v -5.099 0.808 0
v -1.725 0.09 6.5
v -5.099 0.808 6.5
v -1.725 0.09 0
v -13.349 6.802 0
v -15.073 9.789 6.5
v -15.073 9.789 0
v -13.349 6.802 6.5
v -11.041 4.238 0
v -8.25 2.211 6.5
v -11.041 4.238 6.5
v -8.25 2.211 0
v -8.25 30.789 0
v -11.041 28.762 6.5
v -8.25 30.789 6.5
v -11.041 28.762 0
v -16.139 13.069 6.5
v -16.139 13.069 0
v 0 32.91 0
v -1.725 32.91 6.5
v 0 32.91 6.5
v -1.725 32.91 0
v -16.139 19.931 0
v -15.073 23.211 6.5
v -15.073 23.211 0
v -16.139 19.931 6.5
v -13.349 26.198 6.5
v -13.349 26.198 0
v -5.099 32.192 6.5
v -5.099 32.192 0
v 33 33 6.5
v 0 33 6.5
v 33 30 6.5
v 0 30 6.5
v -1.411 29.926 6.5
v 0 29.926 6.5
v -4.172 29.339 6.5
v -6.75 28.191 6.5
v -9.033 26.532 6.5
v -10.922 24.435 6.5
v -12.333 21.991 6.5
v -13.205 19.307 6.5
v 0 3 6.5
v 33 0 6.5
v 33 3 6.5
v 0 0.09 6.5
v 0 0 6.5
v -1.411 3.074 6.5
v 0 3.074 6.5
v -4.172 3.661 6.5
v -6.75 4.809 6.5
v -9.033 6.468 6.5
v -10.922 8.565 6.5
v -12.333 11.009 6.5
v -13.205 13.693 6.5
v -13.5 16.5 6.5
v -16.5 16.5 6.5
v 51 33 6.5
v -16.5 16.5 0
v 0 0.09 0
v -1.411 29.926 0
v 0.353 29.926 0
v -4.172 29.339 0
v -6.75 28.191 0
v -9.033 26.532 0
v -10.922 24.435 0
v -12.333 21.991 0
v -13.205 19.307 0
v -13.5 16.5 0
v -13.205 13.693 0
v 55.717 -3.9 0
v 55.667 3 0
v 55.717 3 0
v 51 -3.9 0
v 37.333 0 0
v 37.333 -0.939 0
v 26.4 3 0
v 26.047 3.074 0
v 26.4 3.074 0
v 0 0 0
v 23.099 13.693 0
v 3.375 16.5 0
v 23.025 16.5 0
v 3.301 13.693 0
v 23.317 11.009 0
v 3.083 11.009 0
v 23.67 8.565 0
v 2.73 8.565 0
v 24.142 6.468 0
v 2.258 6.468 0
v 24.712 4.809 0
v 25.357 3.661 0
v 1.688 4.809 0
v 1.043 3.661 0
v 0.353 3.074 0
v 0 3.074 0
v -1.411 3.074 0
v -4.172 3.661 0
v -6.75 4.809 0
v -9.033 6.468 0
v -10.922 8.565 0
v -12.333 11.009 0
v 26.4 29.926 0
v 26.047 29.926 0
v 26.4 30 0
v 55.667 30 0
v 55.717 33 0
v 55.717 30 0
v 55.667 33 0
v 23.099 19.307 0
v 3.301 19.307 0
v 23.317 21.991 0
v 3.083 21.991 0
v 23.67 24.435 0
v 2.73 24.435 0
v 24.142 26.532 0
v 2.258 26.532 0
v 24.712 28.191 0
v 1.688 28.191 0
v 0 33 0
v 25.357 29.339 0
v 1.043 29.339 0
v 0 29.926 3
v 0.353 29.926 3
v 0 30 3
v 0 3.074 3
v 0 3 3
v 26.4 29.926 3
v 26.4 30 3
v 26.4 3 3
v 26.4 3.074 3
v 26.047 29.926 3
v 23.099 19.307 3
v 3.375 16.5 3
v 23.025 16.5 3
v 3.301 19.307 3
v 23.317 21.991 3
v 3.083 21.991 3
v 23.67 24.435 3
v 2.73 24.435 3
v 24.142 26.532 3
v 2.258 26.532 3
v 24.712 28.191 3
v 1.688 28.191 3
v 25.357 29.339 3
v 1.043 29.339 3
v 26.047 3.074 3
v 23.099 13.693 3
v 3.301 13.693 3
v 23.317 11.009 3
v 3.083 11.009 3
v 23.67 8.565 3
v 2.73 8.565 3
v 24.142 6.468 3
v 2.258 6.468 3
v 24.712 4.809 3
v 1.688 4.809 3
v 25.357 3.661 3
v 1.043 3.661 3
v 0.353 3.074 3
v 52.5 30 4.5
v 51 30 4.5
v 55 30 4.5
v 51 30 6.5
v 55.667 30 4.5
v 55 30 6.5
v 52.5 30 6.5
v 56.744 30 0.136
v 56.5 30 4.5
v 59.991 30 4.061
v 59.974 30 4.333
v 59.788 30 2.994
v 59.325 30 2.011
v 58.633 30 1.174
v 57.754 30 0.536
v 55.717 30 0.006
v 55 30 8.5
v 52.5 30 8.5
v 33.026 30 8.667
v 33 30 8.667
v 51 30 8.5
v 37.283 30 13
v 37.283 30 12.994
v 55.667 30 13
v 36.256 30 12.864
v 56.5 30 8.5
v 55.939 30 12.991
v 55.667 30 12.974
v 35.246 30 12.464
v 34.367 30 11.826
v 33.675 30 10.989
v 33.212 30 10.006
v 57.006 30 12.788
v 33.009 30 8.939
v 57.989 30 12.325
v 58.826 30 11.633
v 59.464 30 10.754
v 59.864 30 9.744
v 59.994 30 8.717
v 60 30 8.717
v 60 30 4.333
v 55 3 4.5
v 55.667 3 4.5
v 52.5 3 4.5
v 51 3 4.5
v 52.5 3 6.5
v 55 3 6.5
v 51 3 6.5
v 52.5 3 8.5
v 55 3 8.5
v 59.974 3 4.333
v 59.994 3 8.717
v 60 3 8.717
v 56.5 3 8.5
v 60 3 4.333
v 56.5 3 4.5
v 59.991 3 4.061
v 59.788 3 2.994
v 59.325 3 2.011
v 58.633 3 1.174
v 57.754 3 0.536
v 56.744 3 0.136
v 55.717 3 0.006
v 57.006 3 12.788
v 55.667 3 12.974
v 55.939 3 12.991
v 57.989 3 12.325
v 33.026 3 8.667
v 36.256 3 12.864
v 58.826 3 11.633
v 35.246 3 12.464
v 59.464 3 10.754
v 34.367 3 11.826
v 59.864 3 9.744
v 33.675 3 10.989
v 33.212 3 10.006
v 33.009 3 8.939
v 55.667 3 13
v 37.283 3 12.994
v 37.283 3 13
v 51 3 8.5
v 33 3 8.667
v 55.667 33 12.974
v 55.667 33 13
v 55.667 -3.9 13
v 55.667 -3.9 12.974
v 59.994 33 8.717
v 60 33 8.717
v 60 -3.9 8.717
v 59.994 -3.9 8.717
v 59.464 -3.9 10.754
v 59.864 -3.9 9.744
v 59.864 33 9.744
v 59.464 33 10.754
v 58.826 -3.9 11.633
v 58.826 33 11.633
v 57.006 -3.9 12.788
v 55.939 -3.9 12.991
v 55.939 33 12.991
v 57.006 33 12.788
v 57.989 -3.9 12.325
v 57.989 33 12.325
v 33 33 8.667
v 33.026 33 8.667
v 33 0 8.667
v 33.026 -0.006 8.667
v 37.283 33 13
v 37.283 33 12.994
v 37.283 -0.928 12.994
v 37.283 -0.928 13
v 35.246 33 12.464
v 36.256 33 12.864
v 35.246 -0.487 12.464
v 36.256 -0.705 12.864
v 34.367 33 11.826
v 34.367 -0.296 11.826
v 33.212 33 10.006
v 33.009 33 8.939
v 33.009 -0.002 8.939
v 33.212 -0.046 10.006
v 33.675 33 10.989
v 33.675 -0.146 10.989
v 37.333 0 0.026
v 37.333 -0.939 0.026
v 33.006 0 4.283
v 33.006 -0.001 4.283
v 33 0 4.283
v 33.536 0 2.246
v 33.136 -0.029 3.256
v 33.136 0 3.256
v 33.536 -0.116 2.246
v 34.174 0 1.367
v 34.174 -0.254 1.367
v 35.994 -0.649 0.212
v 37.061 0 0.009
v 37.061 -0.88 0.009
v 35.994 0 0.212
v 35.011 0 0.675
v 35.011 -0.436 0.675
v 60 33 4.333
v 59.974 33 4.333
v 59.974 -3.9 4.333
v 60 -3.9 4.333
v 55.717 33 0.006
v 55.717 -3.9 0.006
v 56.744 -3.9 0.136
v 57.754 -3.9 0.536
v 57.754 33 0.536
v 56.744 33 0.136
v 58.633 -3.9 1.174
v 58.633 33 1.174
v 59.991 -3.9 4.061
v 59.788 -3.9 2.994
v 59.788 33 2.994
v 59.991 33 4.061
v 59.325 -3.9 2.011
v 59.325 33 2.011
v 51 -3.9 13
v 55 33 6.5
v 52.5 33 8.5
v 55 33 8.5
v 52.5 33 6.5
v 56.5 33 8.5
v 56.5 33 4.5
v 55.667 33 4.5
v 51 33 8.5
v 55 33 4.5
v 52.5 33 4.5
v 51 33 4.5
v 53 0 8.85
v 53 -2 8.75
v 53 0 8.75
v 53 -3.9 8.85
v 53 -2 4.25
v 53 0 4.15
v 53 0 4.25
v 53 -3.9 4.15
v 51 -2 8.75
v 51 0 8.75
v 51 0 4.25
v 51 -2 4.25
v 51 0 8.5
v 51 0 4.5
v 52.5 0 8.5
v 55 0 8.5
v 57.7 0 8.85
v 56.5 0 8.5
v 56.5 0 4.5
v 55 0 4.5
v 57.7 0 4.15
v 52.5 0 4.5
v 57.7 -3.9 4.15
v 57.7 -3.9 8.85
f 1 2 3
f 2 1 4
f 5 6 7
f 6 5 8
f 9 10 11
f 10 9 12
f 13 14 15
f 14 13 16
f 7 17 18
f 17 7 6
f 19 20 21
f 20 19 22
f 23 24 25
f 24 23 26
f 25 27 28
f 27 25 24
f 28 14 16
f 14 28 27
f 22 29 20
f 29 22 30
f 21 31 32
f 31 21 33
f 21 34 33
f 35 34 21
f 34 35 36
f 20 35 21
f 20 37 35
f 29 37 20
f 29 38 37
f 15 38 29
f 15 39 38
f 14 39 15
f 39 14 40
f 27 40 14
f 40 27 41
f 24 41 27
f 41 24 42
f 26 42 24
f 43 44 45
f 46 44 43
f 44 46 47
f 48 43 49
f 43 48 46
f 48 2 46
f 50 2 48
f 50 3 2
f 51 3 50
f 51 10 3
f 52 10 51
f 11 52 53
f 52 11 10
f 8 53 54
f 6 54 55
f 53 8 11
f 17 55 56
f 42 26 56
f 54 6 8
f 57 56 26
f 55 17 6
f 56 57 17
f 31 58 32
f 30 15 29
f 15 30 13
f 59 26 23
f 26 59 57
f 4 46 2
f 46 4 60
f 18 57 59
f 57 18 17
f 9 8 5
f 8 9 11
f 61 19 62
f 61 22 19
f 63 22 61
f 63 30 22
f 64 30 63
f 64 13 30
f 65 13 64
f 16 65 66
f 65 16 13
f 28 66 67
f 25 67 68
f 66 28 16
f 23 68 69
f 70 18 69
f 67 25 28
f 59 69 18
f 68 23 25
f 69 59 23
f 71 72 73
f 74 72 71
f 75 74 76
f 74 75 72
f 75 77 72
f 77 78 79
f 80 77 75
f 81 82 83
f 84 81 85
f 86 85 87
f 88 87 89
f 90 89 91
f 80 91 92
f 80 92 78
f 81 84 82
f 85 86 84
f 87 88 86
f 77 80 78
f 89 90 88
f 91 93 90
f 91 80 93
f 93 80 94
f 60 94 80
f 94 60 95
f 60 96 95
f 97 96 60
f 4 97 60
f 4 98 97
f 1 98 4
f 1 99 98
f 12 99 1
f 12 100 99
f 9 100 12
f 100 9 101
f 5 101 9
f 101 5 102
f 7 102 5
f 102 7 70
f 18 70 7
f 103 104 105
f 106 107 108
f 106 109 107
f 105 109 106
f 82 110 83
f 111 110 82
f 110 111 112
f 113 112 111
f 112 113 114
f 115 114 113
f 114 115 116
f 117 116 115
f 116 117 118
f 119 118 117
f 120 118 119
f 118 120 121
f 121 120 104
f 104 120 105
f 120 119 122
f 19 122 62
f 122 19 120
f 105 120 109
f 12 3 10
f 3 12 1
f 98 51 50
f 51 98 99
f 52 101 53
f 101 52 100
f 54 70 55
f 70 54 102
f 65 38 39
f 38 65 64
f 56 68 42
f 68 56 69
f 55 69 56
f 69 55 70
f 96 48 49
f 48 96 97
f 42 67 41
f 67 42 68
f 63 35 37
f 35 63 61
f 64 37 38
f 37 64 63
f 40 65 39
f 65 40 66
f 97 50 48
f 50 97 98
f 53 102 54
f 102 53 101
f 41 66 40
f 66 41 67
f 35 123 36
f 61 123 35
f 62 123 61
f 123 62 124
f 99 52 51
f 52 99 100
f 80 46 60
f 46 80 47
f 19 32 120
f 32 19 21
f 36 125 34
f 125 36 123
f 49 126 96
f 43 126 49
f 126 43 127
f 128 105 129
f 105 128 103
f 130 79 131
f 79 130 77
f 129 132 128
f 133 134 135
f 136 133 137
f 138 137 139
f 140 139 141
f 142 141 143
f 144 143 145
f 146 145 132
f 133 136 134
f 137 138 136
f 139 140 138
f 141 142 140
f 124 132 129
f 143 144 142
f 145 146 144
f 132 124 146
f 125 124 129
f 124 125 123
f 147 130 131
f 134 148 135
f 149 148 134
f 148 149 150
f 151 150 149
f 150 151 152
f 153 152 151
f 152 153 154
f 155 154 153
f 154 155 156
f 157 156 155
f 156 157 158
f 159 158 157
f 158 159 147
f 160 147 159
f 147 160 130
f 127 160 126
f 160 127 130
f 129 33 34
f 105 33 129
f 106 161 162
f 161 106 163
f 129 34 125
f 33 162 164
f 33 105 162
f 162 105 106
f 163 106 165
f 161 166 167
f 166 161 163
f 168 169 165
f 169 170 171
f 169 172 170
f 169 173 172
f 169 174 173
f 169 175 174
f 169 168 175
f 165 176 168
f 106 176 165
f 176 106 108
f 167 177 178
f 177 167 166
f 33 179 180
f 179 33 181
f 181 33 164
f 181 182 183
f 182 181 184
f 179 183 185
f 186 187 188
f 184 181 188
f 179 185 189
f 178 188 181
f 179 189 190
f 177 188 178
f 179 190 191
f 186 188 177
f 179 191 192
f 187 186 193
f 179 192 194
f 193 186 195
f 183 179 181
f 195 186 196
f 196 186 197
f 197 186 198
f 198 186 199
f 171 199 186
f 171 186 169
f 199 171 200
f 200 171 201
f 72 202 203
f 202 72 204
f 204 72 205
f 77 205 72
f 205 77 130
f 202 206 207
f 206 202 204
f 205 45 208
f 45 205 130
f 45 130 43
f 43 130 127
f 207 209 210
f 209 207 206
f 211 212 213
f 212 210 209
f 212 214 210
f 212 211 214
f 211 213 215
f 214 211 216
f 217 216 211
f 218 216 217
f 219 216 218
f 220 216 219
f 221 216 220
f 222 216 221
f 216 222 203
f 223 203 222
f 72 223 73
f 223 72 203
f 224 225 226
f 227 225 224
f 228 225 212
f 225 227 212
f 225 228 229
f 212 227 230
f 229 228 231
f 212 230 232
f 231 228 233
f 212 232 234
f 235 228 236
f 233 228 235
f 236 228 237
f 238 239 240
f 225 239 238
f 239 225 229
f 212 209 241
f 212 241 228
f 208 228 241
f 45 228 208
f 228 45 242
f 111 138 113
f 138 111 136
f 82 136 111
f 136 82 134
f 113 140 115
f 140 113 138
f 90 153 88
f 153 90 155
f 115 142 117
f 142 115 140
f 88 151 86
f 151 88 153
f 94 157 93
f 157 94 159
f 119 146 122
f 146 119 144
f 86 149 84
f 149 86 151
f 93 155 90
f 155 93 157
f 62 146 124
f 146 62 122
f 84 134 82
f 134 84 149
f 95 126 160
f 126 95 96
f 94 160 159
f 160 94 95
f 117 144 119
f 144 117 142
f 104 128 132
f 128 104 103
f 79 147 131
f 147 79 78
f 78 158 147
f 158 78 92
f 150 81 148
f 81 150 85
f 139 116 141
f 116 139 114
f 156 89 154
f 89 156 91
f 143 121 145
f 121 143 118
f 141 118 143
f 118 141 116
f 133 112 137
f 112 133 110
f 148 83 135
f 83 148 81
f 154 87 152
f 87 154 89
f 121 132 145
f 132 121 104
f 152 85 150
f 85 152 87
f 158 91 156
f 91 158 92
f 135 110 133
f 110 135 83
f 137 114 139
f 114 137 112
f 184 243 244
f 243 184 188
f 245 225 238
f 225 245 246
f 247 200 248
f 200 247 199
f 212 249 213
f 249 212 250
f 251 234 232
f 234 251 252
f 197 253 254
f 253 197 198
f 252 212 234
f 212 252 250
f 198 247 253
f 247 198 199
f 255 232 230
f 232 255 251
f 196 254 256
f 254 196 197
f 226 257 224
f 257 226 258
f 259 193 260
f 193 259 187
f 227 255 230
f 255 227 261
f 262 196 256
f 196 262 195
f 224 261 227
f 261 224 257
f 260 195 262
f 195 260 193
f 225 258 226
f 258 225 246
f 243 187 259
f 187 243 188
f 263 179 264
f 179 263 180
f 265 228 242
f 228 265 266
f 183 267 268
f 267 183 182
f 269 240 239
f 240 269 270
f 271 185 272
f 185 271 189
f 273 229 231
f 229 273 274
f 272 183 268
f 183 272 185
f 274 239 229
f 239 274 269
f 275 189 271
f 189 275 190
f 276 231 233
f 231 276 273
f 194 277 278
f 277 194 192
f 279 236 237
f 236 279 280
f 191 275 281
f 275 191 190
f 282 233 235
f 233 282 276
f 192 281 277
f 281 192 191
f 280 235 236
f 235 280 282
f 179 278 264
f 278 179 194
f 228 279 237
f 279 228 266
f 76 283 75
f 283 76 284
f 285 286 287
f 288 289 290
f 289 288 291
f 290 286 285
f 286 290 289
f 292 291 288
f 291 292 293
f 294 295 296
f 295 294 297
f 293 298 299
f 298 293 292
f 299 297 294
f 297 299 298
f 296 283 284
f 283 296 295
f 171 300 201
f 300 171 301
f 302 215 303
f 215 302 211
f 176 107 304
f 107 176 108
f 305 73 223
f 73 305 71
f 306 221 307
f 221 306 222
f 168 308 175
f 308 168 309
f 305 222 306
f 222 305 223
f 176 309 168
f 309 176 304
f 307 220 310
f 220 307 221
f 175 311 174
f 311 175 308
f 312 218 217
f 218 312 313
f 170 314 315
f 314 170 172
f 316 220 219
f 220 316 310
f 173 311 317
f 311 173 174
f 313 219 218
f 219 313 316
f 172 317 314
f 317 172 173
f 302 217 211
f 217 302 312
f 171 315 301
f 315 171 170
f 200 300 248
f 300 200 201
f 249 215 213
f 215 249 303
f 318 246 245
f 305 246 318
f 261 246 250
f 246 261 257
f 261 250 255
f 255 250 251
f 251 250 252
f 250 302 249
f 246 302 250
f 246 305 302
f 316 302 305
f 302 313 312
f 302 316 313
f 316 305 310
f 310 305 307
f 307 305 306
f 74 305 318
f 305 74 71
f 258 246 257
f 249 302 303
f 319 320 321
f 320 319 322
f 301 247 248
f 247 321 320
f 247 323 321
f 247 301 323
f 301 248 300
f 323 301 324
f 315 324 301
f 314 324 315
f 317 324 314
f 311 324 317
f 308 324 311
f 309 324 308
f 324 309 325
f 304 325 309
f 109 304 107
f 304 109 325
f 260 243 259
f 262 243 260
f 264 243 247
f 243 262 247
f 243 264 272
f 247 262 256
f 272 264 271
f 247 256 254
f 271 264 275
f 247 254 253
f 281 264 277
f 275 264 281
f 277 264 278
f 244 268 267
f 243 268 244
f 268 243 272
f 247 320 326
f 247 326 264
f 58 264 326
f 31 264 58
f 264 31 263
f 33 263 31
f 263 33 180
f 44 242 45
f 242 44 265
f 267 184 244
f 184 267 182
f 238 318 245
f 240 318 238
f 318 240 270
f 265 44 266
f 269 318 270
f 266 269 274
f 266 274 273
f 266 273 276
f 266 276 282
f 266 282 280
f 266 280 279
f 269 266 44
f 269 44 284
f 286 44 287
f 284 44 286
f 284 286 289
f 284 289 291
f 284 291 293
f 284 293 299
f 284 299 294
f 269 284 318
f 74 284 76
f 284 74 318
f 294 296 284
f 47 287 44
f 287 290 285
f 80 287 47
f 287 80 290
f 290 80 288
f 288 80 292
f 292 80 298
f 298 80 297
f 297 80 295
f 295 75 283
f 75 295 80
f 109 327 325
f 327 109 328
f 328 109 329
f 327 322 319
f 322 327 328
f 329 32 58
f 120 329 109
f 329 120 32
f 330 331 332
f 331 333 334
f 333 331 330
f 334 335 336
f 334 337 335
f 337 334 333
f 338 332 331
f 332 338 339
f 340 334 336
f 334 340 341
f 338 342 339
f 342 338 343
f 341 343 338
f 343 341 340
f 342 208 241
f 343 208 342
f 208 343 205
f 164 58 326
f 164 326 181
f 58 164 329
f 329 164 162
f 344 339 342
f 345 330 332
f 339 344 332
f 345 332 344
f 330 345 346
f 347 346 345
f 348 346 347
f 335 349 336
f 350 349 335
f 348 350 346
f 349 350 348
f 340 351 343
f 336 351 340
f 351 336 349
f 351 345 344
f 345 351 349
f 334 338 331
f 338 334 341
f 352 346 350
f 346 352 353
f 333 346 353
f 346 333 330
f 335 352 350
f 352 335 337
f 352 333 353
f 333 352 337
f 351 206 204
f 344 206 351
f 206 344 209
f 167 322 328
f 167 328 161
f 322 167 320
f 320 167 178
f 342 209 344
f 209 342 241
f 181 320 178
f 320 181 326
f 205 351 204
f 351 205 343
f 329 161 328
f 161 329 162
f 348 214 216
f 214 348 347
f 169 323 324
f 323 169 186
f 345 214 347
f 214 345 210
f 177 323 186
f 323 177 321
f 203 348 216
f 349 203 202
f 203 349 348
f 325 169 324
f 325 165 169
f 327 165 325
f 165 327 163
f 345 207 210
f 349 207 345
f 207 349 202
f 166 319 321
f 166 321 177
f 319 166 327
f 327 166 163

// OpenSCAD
// file: roundCornersCube.scad
/*
http://codeviewer.org/view/code:1b36 
Copyright (C) 2011 Sergio Vilches
This program is free software: you can redistribute it and/or modify it under the terms of the GNU General Public License as published by the Free Software Foundation, either version 3 of the License, or (at your option) any later version.
This program is distributed in the hope that it will be useful, but WITHOUT ANY WARRANTY; without even the implied warranty of MERCHANTABILITY or FITNESS FOR A PARTICULAR PURPOSE. See the GNU General Public License for more details. You should have received a copy of the GNU General Public License along with this program. If not, see <http://www.gnu.org/licenses/>.
Contact: s.vilches.e@gmail.com


    ----------------------------------------------------------- 
                 Round Corners Cube (Extruded)                
      roundCornersCube(x,y,z,r) Where:                        
         - x = Xdir width                                     
         - y = Ydir width                                     
         - z = Height of the cube                             
         - r = Rounding radious                               
                                                              
      Example: roundCornerCube(10,10,2,1);                    
     *Some times it's needed to use F6 to see good results!   
 	 ----------------------------------------------------------- 
*/
// Test it!
// roundCornersCube(10,5,2,1);


module createMeniscus(h,radius) // This module creates the shape that needs to be substracted from a cube to make its corners rounded.
difference(){        //This shape is basicly the difference between a quarter of cylinder and a cube
   translate([radius/2+0.1,radius/2+0.1,0]){
      cube([radius+0.2,radius+0.1,h+0.2],center=true);         // All that 0.x numbers are to avoid "ghost boundaries" when substracting
   }

   cylinder(h=h+0.2,r=radius,$fn = 25,center=true);
}


module roundCornersCube(x,y,z,r)  // Now we just substract the shape we have created in the four corners
difference(){
   cube([x,y,z], center=true);

translate([x/2-r,y/2-r]){  // We move to the first corner (x,y)
      rotate(0){  
         createMeniscus(z,r); // And substract the meniscus
      }
   }
   translate([-x/2+r,y/2-r]){ // To the second corner (-x,y)
      rotate(90){
         createMeniscus(z,r); // But this time we have to rotate the meniscus 90 deg
      }
   }
      translate([-x/2+r,-y/2+r]){ // ... 
      rotate(180){
         createMeniscus(z,r);
      }
   }
      translate([x/2-r,-y/2+r]){
      rotate(270){
         createMeniscus(z,r);
      }
   }
}
// main file
/*
	BladeKey Key Organizer
	James David Busch
	james.busch@gmail.com

	Version 7

	All Rights Reserved
*/

include <roundCornersCube.scad>

// Measured Width of Your Bundle of Keys
WIDTH = 27;	// THE WIDTH OF THE KEYS
// Measured Length of your Longest Key
LENGTH = 60;	// THE LENGTH OF THE KEYS

THICK = 3;		// NOTE: DO NOT GO LOWER THAN 3
body_height = 13;
body_keyhead_length = 27;
body_keyblade_length = LENGTH - body_keyhead_length;
body_rounding_radius = body_height / 3;

logo_dxf_width = 20;
logo_dxf_height = 5;
logo_dxf_thick = 0.75;

ziptie_head_x = 4.7;
ziptie_head_y = 3.9;
ziptie_head_z = 4.7;

ziptie_tail_x = 2;
ziptie_tail_y = 2;
ziptie_tail_z = 4.5;

ziptie_hole_x = 1.5;
ziptie_hole_z = 4;

// BEGIN CALCULATIONS
union() {
	difference() {
		union() {
			// Rounded Front
			union() {
				translate(v = [0, WIDTH/2+THICK, (body_height/2)/2]) {
					difference() {
						cylinder(r = WIDTH/2+THICK, h = (body_height/2), center=true);
						cylinder(r = WIDTH/2, h = (body_height/2), center=true);
						translate(v = [0, -WIDTH/2-THICK,-(body_height/2)/2]) {
							cube(size = [WIDTH/2+THICK,WIDTH+2*THICK,(body_height/2)]);
						}
					}
				}
			}
		
			// Base
			union() {
				difference() {
					translate(v = [0,THICK,0]) {
						cube(size = [body_keyblade_length*4/5, WIDTH, THICK]);
					}
					// Circular Cut-Out in the Front of the Base
					translate(v = [0, WIDTH/2+THICK, (body_height/2)/2]) {
						scale([.25,1,1])cylinder(r = WIDTH/2, h = (body_height/2), center=true);
					}
					// Circular Cut-Out in the Back of the Base
					translate(v = [body_keyblade_length*4/5, WIDTH/2+THICK, (body_height/2)/2]) {
						scale([.25,1,1])cylinder(r = WIDTH/2, h = (body_height/2), center=true);
					}
				}
			}
		
			// Sides
			union() {
				// SIDE with LOGO
				cube(size = [body_keyblade_length + body_keyhead_length - body_rounding_radius, THICK, body_height/2]);
				translate(v = [(body_keyblade_length-logo_dxf_width)/2, -logo_dxf_thick/2, (body_height/4)-(logo_dxf_height/2)]) {
					rotate(a  = [90, 0, 0]) {
						scale(v = [1,1,1]) {
							color([0.0, 0.0, 1.0, 1.0]) {
								linear_extrude(file = "BladeKey_Logo.dxf",  height = logo_dxf_thick, center = true);
							}
						}
					}
				}
				// SIDE
				translate(v = [0,THICK+WIDTH,0]) {
					cube(size = [body_keyblade_length + body_keyhead_length  - body_rounding_radius, THICK, body_height/2]);
				}
			
				// TALL ROUNDED SIDES
				difference() {
					// CREATE A ROUNDED CORNER CUBE FOR THE TALL SIDE
					translate(v = [body_keyhead_length/2+body_keyblade_length, THICK+WIDTH/2 -  ziptie_head_y/2, (body_height/2)]) {
						rotate(a = [90, 0, 0]) {
							roundCornersCube(body_keyhead_length, body_height, 2*THICK+WIDTH +  ziptie_head_y, body_rounding_radius);
						}
					}
					// CUT THE AREA FOR THE KEYS OUT OF THE TALL SIDE
					translate(v = [body_keyblade_length, THICK, -1]) {
						cube(size = [body_keyhead_length, WIDTH, body_height+2]);
					}
					// CUT AN ANGLE OUT OF THE TALL SIDE
					translate(v = [body_keyblade_length, 0, -1]) {
						mirror([0,1,0]){
							rotate(a = [0, 0, atan2(ziptie_head_y, body_keyhead_length-9)]) {
								cube(size = [body_keyhead_length, ziptie_head_y*2, body_height+2]);
							}
						}
					}
				}
			}
		}
		
		union() {
			// Create the Zip Tie Holes
			translate(v = [LENGTH - 9, -1, (body_height/2) - ziptie_hole_z/2]) {
				cube(size = [ziptie_hole_x, WIDTH+2*THICK+2, ziptie_hole_z]);
			}
			translate(v = [LENGTH - 5, -1, (body_height/2) - ziptie_hole_z/2]) {
				cube(size = [ziptie_hole_x, WIDTH+2*THICK+2, ziptie_hole_z]);
			}
			
			// Zip Tie Carveout
			union() {
				// TAIL
				translate(v = [LENGTH - 9, -ziptie_tail_y, body_height/2 - ziptie_tail_z/2]) {
					cube(size = [ziptie_tail_x, ziptie_tail_y, ziptie_tail_z]);
				}
				// HEAD
				translate(v = [LENGTH - 9 + ziptie_tail_x, -ziptie_head_y, body_height/2 - ziptie_head_z/2]) {
					cube(size = [ziptie_head_x, ziptie_head_y, ziptie_head_z]);
				}
			}
		}
	}
}
